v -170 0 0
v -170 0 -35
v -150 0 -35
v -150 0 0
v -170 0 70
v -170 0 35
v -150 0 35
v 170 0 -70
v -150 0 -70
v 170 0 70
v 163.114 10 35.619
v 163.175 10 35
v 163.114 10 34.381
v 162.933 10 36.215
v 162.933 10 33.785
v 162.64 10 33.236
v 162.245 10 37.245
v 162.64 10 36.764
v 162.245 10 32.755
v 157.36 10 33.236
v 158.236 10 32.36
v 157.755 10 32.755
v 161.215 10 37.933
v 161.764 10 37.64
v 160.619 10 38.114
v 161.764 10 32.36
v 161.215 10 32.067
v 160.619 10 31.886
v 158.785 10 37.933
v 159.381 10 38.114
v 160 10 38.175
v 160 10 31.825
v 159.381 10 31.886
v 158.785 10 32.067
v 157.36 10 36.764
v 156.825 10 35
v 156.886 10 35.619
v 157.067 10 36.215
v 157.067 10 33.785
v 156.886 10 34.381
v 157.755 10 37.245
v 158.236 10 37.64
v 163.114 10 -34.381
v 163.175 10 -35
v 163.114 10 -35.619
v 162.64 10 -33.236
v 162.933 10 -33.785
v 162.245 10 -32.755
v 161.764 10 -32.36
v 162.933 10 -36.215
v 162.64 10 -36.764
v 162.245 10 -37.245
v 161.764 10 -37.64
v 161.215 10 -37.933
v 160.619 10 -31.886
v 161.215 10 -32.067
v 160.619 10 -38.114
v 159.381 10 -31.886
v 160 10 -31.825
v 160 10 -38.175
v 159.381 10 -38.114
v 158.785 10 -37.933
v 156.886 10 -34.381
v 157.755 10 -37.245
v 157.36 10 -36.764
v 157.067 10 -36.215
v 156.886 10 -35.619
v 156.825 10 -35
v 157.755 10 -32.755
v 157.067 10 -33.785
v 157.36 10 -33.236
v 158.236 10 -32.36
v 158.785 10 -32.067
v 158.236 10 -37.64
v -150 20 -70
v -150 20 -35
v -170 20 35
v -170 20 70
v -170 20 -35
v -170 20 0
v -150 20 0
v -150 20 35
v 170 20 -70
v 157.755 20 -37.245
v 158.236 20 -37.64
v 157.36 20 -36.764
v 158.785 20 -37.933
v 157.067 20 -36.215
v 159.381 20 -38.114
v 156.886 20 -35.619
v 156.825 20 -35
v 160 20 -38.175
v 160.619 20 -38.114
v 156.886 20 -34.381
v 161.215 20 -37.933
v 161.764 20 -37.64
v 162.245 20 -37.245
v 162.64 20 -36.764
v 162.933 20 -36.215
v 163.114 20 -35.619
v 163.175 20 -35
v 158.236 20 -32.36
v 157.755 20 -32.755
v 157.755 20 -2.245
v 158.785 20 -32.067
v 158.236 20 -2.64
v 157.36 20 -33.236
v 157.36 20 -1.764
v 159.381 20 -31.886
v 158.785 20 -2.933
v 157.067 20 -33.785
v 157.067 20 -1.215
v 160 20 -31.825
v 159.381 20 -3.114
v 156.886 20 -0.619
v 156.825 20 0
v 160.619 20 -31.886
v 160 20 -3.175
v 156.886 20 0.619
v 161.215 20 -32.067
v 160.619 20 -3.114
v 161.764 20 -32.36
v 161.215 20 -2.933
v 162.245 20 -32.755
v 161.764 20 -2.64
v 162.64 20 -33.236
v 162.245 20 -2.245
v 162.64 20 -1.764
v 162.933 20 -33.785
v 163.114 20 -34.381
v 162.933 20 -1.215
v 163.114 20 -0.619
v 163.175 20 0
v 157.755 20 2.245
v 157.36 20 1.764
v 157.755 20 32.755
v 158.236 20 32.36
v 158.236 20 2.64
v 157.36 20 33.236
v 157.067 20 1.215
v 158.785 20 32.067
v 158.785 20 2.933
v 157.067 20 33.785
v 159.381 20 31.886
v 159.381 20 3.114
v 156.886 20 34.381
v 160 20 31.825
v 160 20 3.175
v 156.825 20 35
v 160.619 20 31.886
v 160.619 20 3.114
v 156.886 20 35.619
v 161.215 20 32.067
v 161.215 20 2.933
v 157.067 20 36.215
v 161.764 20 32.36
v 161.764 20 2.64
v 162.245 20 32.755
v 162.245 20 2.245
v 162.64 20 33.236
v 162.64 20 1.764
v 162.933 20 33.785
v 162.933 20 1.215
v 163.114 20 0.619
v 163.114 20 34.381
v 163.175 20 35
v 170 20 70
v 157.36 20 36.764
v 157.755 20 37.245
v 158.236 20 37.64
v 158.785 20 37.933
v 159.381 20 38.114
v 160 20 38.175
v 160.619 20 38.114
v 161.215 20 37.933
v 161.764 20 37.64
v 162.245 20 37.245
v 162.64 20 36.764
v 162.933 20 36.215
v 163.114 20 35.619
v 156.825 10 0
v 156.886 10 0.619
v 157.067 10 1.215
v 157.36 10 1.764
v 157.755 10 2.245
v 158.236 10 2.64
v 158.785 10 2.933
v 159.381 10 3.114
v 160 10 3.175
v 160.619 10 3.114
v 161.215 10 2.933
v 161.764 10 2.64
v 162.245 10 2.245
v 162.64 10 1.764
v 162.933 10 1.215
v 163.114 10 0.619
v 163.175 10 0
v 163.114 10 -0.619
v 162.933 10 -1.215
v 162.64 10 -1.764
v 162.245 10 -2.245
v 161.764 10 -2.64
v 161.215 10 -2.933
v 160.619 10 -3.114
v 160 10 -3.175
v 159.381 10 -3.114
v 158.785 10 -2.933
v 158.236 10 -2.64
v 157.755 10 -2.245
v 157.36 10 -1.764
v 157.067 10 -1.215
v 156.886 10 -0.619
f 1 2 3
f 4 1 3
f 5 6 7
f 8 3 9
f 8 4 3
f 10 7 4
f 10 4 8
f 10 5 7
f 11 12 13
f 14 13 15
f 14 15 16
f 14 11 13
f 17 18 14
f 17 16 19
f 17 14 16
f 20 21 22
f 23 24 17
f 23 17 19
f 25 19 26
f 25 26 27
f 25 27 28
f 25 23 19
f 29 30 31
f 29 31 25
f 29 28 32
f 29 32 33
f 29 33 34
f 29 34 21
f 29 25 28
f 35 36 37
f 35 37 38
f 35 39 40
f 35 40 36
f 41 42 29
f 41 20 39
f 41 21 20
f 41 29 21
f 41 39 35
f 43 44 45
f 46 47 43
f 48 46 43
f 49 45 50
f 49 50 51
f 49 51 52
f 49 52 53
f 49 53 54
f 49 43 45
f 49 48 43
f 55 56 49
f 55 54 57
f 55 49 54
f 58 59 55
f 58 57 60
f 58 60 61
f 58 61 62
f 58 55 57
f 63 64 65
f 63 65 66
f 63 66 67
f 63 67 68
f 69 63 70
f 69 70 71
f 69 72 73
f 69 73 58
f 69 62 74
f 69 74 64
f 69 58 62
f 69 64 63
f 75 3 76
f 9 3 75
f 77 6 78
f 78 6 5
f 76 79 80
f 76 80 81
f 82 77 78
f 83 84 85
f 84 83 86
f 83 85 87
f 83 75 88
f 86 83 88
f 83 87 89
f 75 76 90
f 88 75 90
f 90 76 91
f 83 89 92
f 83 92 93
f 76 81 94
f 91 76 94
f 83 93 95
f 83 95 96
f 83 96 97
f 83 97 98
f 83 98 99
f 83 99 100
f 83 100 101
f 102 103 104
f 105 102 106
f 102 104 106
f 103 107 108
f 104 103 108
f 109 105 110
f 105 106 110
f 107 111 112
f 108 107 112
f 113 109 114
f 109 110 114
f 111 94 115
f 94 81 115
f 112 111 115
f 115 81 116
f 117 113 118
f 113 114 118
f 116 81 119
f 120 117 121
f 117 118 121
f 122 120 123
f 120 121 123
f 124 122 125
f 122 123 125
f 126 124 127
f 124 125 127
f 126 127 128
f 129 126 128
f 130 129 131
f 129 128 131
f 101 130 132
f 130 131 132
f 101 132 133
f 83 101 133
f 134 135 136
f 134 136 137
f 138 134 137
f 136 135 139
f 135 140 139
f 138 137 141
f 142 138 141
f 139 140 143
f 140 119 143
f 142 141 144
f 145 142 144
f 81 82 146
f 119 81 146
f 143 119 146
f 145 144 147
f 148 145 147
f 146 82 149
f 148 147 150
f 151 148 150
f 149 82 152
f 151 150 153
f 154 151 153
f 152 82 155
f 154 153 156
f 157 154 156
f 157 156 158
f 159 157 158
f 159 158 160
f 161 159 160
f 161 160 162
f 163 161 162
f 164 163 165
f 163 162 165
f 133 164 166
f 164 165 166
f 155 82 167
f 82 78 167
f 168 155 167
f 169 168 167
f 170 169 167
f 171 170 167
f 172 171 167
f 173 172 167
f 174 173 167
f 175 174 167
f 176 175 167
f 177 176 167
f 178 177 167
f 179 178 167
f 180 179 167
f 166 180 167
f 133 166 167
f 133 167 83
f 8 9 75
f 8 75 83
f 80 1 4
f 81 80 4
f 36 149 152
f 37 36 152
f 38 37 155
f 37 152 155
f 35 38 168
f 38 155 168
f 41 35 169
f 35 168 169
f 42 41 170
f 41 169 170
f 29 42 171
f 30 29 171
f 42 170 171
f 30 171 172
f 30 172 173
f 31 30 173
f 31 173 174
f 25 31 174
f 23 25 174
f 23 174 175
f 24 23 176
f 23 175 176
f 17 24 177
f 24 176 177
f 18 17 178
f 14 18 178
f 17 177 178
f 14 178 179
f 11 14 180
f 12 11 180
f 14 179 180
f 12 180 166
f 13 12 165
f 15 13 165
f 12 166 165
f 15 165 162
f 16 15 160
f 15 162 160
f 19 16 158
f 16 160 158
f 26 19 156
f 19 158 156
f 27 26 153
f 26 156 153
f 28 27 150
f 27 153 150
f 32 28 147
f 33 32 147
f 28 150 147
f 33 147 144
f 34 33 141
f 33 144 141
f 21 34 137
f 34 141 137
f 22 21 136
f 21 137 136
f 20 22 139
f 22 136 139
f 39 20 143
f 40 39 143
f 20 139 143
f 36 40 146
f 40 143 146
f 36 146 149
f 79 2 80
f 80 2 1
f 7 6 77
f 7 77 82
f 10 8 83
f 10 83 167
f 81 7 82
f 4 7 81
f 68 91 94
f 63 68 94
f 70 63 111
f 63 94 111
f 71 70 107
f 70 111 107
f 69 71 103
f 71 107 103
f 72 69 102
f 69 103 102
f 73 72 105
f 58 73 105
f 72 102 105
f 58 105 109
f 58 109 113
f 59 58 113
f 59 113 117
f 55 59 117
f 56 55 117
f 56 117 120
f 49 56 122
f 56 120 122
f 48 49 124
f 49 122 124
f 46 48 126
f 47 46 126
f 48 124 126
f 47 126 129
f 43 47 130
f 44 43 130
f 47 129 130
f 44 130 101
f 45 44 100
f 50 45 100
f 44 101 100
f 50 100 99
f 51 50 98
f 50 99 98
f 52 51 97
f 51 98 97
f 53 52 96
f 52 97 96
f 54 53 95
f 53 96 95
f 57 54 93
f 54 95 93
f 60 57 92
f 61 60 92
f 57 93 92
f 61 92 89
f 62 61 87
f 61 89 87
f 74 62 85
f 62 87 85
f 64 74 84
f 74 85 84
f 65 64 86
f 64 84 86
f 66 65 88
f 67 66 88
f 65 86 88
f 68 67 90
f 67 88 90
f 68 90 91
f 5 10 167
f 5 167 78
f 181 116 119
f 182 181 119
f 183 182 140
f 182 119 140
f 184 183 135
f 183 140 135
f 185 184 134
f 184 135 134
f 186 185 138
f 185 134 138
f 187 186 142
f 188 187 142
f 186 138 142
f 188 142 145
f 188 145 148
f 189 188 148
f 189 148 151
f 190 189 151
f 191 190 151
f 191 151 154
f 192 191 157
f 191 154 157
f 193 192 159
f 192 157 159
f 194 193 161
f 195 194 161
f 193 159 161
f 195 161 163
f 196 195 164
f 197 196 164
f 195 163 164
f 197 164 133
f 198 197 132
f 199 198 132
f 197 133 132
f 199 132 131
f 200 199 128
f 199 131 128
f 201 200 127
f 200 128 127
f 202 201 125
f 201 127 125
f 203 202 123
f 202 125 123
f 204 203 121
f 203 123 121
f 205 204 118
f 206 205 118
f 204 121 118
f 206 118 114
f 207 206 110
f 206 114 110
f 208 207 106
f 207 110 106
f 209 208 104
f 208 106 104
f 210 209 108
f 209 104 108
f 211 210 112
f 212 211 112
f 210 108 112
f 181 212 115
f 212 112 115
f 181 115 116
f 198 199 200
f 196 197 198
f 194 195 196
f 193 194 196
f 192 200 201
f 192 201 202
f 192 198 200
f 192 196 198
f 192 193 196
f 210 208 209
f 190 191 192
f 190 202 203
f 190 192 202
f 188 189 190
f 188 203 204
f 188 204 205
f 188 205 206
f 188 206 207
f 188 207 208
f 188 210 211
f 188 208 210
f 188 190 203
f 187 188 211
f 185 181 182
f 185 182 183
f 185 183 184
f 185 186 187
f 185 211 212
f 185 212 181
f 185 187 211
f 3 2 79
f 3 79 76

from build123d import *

# Parameters (mm, degrees)
F0_W     = 20
F0_H     = 35
F1_DEPTH = 20
F3_R     = 3.175
F4_DEPTH = 10


# Not quite as in the source:
# - a feature names something its author has since deleted; it is built from what else it names


with BuildPart() as f1:
    # F0 (on Front) → F1 (new body)
    with BuildSketch(Plane.XZ):
        with Locations((-160, 52.5)):
            Rectangle(F0_W, F0_H)
        with Locations((-160, -17.5)):
            Rectangle(F0_W, F0_H)
        Polygon((170, -70), (170, 70), (150, 70), (-150, 70), (-150, 35), (-150, 0), (-150, -35), (-150, -70), (150, -70), align=None)
    extrude(amount=-F1_DEPTH)

    # F3 (on face) → F4 (cut)
    with BuildSketch(Plane(origin=(0, 20, 0), x_dir=(-1, 0, 0), z_dir=(0, 1, 0))):
        with Locations((-160.0000113249, 35.0000448525)):
            Circle(F3_R)
        with Locations((-160.0000560284, 0)):
            Circle(F3_R)
        with Locations((-160.0000113249, -35.0000634789)):
            Circle(F3_R)
    extrude(amount=-F4_DEPTH, mode=Mode.SUBTRACT)


solid = f1.part
